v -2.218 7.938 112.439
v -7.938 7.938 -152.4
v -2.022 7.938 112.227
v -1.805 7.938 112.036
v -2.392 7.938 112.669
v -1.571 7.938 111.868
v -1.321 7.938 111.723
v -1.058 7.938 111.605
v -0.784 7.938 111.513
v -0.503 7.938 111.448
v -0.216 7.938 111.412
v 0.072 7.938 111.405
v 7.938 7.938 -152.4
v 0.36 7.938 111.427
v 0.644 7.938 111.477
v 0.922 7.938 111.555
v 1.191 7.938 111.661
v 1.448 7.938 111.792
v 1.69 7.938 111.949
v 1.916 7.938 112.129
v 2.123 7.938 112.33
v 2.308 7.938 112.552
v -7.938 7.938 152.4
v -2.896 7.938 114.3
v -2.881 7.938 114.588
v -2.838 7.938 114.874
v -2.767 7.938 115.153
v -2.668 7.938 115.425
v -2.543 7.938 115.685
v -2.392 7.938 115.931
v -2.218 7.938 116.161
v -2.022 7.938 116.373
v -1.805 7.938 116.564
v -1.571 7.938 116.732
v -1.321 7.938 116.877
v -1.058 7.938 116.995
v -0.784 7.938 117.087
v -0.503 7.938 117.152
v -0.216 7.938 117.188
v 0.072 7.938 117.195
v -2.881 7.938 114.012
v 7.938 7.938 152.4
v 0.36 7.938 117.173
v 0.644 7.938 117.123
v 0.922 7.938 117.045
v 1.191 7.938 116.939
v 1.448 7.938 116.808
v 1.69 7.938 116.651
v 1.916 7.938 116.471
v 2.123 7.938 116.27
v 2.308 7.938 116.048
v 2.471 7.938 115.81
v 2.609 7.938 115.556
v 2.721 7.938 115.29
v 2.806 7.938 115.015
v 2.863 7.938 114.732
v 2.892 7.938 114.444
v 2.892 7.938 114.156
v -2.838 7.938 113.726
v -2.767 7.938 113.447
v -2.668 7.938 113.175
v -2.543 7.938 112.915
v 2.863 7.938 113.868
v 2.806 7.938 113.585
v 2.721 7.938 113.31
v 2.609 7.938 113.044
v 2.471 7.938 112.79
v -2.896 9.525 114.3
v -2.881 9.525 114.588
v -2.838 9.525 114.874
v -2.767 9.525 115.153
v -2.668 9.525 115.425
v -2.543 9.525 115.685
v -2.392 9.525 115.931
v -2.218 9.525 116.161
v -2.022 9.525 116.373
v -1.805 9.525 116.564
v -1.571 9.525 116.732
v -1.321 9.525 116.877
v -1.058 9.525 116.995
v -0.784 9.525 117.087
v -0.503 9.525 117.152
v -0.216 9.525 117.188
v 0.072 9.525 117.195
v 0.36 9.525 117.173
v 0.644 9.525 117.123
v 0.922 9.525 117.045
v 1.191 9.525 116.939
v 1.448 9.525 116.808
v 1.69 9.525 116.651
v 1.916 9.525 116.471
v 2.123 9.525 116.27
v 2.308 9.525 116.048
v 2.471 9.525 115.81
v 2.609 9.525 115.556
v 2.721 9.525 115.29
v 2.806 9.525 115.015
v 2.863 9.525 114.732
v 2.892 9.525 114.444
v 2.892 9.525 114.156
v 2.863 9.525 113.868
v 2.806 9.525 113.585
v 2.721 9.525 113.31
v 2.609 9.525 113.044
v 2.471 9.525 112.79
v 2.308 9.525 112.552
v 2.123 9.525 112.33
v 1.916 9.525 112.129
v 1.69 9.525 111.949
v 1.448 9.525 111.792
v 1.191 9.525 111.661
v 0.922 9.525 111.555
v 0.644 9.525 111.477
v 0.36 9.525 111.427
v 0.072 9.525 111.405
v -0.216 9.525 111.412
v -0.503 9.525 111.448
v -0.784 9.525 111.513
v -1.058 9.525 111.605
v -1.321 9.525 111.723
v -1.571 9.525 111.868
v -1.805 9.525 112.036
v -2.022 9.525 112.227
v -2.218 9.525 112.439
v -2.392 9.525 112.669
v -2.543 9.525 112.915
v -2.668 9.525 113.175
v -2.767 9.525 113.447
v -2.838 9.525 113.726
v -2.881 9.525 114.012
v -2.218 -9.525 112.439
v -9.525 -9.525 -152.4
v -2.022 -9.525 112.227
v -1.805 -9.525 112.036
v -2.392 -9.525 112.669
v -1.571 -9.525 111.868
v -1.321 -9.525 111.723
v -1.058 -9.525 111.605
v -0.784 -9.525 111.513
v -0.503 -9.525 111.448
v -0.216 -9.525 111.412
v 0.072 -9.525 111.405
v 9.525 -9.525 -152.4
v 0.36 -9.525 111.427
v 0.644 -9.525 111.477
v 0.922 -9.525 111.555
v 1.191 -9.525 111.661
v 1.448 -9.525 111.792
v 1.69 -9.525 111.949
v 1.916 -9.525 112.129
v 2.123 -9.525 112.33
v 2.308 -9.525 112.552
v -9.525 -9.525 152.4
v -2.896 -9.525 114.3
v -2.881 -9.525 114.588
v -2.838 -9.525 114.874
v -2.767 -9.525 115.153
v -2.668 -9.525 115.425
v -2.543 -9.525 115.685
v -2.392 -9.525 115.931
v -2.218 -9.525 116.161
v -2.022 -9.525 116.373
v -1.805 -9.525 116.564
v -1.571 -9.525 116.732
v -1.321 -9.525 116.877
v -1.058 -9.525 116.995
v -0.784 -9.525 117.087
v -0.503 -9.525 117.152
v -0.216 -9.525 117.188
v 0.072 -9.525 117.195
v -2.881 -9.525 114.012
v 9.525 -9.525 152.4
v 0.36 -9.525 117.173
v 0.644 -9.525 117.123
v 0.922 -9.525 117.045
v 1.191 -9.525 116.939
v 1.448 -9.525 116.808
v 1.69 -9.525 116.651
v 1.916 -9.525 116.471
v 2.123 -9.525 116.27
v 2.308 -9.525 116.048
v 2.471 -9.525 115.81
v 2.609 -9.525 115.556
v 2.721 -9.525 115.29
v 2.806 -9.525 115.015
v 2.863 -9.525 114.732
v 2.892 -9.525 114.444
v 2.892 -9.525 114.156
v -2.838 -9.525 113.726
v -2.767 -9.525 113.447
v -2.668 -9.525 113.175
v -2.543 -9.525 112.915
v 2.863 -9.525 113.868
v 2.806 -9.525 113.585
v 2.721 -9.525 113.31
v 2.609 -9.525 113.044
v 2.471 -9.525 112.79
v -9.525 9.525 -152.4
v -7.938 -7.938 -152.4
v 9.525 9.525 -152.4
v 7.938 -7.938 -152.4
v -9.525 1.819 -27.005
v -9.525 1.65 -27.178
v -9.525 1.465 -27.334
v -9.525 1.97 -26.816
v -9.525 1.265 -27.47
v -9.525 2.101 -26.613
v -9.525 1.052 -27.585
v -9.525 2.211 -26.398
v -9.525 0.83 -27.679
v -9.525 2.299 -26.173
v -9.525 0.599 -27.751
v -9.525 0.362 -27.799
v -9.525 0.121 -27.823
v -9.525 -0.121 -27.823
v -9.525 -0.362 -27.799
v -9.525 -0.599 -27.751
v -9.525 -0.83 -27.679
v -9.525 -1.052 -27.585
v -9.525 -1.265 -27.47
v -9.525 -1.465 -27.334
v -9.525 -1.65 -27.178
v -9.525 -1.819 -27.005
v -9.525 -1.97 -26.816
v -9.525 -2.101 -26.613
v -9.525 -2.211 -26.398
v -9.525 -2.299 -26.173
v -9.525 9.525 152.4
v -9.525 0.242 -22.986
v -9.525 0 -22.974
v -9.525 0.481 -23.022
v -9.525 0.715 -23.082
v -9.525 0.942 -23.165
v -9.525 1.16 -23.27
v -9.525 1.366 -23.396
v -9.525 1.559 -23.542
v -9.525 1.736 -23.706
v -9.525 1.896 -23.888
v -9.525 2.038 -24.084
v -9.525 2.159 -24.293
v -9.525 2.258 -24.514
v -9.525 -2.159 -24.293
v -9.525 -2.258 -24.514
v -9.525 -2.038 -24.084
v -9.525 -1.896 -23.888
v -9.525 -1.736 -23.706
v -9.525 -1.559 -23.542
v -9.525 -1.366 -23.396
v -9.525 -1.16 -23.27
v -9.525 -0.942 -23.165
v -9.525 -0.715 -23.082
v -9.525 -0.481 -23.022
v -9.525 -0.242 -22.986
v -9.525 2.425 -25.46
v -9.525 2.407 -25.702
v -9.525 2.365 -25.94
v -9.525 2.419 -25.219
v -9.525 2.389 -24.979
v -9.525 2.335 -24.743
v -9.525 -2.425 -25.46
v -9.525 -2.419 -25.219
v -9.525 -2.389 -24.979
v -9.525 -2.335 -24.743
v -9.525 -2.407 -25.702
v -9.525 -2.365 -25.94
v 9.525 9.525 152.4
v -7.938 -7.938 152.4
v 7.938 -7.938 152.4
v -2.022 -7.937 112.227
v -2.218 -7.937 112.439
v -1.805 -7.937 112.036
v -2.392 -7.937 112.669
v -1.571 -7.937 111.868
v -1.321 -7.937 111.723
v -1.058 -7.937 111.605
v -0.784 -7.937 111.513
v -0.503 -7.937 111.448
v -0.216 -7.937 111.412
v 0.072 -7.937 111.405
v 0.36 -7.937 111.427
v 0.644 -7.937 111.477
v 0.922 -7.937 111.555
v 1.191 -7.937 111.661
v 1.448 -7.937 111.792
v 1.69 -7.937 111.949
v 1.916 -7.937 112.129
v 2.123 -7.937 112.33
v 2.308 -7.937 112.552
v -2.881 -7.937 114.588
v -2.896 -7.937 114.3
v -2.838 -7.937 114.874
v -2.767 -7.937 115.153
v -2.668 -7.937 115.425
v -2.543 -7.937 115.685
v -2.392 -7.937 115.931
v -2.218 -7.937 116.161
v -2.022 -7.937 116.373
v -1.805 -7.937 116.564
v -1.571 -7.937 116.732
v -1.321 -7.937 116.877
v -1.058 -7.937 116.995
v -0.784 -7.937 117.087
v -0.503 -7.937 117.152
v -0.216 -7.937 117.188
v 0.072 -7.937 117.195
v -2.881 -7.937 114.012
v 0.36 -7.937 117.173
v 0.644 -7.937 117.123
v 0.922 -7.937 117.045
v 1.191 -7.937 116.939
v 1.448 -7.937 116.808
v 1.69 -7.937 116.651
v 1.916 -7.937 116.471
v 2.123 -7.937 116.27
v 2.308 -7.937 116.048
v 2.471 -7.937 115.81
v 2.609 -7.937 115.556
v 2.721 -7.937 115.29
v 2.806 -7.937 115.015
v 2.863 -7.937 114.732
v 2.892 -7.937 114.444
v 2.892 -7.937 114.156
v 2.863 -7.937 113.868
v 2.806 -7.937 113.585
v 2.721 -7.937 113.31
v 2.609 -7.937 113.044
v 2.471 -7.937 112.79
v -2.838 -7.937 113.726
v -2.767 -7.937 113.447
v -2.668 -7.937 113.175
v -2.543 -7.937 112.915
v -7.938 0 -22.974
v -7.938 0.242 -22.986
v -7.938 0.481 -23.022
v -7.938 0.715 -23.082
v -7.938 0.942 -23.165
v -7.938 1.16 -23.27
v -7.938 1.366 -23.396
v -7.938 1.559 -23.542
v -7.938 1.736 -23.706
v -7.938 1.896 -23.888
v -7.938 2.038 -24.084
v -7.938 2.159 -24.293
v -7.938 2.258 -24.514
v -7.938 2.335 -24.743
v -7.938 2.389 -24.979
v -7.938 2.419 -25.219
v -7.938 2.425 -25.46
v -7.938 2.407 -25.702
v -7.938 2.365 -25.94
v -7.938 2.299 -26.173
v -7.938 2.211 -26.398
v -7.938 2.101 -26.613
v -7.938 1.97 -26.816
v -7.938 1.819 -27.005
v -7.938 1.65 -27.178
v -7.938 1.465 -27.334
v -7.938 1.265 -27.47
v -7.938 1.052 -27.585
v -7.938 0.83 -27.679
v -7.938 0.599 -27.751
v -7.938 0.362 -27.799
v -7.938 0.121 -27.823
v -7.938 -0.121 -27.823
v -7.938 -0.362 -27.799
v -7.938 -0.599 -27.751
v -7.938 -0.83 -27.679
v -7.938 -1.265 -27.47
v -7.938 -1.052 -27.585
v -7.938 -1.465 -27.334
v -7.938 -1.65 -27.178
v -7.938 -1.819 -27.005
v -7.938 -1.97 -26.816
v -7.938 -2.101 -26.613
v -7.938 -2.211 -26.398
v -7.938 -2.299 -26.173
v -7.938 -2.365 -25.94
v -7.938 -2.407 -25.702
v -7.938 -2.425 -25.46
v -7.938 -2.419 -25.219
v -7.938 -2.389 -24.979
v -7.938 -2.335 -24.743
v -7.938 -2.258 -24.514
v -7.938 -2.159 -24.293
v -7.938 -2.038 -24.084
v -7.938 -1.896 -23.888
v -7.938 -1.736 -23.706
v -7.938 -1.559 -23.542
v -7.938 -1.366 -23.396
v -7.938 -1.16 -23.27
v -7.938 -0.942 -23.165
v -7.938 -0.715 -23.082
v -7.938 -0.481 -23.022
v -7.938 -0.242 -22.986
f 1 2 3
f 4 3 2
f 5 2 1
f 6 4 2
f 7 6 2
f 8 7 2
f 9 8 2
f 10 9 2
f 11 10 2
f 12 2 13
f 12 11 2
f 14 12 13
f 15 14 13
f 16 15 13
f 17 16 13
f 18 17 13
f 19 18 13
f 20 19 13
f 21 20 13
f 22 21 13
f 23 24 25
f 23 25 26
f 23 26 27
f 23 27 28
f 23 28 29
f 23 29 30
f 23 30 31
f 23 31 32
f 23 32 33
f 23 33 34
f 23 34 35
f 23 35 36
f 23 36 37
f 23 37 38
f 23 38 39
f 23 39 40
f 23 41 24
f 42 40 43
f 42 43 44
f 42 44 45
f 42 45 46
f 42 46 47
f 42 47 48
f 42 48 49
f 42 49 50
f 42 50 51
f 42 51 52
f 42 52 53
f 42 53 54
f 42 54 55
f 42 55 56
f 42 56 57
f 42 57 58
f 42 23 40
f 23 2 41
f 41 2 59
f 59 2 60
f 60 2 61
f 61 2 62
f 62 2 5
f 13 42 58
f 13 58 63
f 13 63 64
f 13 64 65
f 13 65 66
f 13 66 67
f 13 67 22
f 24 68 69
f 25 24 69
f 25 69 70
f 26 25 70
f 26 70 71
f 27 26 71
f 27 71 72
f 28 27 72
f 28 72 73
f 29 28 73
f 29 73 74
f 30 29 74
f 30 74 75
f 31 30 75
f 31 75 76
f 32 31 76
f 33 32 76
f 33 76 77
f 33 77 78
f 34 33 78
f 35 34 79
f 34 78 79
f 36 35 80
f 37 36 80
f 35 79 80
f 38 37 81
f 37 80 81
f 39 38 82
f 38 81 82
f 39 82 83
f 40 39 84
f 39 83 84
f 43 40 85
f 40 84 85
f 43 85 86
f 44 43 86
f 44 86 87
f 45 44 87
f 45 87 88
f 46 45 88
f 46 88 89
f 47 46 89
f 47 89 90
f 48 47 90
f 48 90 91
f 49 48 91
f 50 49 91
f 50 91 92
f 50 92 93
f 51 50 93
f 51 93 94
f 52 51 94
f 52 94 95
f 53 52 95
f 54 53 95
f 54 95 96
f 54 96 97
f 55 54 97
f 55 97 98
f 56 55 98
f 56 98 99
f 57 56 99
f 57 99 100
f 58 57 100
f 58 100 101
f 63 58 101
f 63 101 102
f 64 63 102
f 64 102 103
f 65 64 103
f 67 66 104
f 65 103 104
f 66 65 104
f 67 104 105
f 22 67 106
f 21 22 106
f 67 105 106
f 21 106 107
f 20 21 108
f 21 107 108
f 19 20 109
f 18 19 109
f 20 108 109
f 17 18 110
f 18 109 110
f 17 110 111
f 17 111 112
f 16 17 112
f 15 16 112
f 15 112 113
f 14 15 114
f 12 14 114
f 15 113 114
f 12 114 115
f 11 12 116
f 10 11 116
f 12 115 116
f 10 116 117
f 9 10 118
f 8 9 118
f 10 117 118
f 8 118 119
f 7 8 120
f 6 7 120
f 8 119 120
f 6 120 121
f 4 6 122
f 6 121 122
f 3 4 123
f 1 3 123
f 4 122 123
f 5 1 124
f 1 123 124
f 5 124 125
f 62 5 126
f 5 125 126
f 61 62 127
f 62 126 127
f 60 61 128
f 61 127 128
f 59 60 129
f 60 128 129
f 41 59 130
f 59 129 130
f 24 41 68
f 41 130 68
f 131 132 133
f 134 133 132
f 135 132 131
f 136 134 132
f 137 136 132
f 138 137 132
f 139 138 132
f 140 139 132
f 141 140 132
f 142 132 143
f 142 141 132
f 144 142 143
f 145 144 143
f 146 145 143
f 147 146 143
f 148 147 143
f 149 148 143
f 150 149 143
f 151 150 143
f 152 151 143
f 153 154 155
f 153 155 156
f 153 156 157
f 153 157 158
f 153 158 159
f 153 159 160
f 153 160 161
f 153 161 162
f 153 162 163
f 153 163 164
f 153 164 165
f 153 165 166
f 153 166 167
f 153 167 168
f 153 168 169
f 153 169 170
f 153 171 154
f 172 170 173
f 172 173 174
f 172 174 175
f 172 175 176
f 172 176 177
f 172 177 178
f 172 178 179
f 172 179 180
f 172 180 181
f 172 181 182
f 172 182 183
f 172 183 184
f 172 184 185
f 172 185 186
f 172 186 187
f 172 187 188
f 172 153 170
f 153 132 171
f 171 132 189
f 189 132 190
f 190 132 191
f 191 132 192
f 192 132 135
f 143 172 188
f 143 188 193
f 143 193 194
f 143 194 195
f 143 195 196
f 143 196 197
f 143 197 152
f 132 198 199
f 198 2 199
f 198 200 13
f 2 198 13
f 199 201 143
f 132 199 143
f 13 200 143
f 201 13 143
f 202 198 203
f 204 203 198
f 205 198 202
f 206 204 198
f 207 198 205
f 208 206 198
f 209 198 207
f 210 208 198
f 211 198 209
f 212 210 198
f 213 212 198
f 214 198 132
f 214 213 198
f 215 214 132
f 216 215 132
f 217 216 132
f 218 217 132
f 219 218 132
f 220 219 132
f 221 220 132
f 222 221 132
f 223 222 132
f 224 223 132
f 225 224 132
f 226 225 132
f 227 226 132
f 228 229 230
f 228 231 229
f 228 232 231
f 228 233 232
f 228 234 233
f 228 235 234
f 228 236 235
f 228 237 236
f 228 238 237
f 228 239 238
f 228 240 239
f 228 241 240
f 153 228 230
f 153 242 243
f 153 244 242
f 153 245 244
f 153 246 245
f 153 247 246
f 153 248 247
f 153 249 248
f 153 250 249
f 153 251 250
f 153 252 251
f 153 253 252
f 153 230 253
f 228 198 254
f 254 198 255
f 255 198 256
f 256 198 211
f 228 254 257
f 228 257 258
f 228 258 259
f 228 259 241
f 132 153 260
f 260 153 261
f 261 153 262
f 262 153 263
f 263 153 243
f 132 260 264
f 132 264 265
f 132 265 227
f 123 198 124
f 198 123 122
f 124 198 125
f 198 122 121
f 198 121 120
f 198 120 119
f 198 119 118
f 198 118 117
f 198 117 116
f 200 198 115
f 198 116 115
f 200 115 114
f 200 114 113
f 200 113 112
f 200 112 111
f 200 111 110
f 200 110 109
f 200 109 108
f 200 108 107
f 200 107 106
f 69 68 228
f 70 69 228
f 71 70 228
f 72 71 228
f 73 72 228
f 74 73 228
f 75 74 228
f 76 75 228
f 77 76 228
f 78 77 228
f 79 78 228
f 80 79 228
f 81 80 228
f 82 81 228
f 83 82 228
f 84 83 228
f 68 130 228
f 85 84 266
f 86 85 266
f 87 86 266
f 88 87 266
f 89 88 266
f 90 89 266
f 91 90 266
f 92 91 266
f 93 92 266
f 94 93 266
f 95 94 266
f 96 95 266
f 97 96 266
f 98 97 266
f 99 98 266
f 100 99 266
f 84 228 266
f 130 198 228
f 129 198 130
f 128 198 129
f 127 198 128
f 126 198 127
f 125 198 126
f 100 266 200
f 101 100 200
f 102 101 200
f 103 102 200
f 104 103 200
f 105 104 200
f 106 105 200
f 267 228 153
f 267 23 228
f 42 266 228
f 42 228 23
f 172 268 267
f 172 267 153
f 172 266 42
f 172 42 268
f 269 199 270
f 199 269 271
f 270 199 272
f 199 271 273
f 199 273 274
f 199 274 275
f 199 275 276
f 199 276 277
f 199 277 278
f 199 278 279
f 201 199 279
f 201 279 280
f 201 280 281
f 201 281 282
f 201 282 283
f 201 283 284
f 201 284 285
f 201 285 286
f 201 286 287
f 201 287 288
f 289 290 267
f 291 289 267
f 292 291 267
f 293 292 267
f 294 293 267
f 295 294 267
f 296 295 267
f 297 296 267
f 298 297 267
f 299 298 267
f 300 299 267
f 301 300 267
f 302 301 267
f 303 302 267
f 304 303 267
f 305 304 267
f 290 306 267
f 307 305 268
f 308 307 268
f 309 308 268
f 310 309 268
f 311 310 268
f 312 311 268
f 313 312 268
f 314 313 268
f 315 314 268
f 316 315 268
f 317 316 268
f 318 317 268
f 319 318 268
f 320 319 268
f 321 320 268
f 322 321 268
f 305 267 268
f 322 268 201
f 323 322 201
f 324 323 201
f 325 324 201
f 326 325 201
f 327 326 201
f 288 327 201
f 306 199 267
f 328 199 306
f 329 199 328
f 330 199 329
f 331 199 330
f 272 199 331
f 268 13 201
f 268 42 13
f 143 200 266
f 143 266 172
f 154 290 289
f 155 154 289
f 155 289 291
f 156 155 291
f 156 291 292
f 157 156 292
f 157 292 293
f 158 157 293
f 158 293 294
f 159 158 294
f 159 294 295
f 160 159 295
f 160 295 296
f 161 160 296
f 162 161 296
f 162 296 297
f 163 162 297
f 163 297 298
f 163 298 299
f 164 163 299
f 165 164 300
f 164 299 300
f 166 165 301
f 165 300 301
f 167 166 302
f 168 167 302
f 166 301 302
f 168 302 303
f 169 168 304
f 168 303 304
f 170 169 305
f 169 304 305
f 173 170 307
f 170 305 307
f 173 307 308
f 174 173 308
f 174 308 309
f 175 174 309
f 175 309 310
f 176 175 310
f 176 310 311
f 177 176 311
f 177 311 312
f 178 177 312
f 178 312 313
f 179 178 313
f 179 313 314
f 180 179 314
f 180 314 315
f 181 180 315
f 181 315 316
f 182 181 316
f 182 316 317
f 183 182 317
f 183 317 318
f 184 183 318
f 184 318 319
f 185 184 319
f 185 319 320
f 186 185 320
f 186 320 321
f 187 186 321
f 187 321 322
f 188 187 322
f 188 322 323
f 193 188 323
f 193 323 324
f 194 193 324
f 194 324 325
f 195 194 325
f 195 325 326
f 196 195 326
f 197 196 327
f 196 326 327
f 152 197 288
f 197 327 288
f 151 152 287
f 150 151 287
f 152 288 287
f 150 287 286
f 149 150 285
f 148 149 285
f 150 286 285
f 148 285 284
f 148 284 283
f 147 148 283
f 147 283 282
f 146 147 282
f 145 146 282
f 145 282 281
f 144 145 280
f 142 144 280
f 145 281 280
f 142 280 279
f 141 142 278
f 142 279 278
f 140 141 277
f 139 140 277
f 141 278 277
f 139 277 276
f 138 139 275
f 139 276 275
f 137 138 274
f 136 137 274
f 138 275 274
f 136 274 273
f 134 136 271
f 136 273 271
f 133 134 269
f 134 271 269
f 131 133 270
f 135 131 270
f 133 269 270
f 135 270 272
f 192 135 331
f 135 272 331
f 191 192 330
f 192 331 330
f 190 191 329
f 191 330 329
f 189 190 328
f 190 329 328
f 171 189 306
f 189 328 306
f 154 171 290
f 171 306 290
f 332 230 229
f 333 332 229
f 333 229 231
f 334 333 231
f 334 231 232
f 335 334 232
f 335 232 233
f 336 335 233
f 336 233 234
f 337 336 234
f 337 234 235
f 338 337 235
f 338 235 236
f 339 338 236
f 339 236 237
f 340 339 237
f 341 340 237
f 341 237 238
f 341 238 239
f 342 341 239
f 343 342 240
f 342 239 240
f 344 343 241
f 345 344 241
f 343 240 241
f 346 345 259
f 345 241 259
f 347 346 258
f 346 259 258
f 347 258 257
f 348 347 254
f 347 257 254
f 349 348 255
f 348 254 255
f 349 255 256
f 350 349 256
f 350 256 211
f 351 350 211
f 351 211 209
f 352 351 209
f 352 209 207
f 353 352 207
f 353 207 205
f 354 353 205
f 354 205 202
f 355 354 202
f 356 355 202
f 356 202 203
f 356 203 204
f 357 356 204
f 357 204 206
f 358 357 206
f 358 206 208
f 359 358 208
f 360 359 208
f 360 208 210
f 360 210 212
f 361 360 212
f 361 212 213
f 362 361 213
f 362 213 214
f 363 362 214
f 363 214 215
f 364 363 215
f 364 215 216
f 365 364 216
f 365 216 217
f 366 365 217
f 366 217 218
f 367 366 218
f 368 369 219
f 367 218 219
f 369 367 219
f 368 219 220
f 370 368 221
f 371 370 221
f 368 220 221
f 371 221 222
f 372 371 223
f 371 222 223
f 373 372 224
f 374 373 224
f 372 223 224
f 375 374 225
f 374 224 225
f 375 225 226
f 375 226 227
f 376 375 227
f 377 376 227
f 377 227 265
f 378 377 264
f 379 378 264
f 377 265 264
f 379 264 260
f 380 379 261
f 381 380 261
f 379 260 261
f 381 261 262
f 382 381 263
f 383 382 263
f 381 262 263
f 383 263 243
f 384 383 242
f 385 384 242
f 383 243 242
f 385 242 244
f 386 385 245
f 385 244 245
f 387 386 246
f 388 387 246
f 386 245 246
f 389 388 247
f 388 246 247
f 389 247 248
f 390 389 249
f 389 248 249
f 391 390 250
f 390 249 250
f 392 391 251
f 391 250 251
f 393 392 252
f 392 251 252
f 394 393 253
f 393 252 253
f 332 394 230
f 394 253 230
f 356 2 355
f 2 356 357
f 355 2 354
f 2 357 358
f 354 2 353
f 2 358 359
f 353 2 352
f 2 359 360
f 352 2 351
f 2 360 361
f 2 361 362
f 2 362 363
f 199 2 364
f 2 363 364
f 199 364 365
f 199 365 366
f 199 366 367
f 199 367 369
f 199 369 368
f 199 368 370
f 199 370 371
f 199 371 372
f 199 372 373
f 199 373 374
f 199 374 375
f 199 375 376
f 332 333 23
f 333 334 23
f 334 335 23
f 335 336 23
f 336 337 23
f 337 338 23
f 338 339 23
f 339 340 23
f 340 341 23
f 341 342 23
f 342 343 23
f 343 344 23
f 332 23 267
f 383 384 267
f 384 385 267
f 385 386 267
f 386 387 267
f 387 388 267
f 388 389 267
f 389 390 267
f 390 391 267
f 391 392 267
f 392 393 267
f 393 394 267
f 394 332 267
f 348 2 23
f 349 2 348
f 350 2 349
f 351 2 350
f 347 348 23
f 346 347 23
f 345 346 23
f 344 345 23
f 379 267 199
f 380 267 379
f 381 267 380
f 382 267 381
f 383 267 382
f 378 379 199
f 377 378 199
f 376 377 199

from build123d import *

# Parameters (mm, degrees)
SKETCH1_W                   = 19.05
SKETCH1_H                   = 19.05
SKETCH1_W_2                 = 15.875
SKETCH1_H_2                 = 15.875
BOSS_EXTRUDE1_DEPTH         = 152.4
SKETCH2_R                   = 2.8956
BASEPLATE_MOUNT_HOLE_DEPTH  = 154.881084364
PS_BRACKET_MOUNT_HOLE_REACH = 155.881
SKETCH3_R                   = 2.4257


with BuildPart() as part:
    # Sketch1 → Boss-Extrude1 (new, symmetric)
    with BuildSketch(Plane(origin=(0, 0, 0), x_dir=(0, -1, 0), z_dir=(0, 0, 1))):
        Rectangle(SKETCH1_W, SKETCH1_H)
        Rectangle(SKETCH1_W_2, SKETCH1_H_2, mode=Mode.SUBTRACT)
    extrude(amount=BOSS_EXTRUDE1_DEPTH, both=True)

    # Sketch2 → Baseplate Mount Hole (cut, through all)
    with BuildSketch(Plane(origin=(0, 9.525, 0), x_dir=(1, 0, 0), z_dir=(0, 1, 0))):
        with Locations(Location((0, -114.3, 0), (0, 0, 180))):
            Circle(SKETCH2_R)
    extrude(amount=-BASEPLATE_MOUNT_HOLE_DEPTH, mode=Mode.SUBTRACT)

    # Sketch3 → PS Bracket Mount Hole (cut, up to next)
    with BuildSketch(Plane.ZY.offset(9.525), mode=Mode.PRIVATE) as ps_bracket_mount_hole_sk1:
        with Locations((-25.4, 0)):
            Circle(SKETCH3_R)
    ps_bracket_mount_hole_tool1 = extrude(ps_bracket_mount_hole_sk1.sketch, amount=-PS_BRACKET_MOUNT_HOLE_REACH, mode=Mode.PRIVATE) & part.part
    add(ps_bracket_mount_hole_tool1.solids().sort_by_distance((-9.525, 0, -25.4))[0], mode=Mode.SUBTRACT)


solid = part.part
